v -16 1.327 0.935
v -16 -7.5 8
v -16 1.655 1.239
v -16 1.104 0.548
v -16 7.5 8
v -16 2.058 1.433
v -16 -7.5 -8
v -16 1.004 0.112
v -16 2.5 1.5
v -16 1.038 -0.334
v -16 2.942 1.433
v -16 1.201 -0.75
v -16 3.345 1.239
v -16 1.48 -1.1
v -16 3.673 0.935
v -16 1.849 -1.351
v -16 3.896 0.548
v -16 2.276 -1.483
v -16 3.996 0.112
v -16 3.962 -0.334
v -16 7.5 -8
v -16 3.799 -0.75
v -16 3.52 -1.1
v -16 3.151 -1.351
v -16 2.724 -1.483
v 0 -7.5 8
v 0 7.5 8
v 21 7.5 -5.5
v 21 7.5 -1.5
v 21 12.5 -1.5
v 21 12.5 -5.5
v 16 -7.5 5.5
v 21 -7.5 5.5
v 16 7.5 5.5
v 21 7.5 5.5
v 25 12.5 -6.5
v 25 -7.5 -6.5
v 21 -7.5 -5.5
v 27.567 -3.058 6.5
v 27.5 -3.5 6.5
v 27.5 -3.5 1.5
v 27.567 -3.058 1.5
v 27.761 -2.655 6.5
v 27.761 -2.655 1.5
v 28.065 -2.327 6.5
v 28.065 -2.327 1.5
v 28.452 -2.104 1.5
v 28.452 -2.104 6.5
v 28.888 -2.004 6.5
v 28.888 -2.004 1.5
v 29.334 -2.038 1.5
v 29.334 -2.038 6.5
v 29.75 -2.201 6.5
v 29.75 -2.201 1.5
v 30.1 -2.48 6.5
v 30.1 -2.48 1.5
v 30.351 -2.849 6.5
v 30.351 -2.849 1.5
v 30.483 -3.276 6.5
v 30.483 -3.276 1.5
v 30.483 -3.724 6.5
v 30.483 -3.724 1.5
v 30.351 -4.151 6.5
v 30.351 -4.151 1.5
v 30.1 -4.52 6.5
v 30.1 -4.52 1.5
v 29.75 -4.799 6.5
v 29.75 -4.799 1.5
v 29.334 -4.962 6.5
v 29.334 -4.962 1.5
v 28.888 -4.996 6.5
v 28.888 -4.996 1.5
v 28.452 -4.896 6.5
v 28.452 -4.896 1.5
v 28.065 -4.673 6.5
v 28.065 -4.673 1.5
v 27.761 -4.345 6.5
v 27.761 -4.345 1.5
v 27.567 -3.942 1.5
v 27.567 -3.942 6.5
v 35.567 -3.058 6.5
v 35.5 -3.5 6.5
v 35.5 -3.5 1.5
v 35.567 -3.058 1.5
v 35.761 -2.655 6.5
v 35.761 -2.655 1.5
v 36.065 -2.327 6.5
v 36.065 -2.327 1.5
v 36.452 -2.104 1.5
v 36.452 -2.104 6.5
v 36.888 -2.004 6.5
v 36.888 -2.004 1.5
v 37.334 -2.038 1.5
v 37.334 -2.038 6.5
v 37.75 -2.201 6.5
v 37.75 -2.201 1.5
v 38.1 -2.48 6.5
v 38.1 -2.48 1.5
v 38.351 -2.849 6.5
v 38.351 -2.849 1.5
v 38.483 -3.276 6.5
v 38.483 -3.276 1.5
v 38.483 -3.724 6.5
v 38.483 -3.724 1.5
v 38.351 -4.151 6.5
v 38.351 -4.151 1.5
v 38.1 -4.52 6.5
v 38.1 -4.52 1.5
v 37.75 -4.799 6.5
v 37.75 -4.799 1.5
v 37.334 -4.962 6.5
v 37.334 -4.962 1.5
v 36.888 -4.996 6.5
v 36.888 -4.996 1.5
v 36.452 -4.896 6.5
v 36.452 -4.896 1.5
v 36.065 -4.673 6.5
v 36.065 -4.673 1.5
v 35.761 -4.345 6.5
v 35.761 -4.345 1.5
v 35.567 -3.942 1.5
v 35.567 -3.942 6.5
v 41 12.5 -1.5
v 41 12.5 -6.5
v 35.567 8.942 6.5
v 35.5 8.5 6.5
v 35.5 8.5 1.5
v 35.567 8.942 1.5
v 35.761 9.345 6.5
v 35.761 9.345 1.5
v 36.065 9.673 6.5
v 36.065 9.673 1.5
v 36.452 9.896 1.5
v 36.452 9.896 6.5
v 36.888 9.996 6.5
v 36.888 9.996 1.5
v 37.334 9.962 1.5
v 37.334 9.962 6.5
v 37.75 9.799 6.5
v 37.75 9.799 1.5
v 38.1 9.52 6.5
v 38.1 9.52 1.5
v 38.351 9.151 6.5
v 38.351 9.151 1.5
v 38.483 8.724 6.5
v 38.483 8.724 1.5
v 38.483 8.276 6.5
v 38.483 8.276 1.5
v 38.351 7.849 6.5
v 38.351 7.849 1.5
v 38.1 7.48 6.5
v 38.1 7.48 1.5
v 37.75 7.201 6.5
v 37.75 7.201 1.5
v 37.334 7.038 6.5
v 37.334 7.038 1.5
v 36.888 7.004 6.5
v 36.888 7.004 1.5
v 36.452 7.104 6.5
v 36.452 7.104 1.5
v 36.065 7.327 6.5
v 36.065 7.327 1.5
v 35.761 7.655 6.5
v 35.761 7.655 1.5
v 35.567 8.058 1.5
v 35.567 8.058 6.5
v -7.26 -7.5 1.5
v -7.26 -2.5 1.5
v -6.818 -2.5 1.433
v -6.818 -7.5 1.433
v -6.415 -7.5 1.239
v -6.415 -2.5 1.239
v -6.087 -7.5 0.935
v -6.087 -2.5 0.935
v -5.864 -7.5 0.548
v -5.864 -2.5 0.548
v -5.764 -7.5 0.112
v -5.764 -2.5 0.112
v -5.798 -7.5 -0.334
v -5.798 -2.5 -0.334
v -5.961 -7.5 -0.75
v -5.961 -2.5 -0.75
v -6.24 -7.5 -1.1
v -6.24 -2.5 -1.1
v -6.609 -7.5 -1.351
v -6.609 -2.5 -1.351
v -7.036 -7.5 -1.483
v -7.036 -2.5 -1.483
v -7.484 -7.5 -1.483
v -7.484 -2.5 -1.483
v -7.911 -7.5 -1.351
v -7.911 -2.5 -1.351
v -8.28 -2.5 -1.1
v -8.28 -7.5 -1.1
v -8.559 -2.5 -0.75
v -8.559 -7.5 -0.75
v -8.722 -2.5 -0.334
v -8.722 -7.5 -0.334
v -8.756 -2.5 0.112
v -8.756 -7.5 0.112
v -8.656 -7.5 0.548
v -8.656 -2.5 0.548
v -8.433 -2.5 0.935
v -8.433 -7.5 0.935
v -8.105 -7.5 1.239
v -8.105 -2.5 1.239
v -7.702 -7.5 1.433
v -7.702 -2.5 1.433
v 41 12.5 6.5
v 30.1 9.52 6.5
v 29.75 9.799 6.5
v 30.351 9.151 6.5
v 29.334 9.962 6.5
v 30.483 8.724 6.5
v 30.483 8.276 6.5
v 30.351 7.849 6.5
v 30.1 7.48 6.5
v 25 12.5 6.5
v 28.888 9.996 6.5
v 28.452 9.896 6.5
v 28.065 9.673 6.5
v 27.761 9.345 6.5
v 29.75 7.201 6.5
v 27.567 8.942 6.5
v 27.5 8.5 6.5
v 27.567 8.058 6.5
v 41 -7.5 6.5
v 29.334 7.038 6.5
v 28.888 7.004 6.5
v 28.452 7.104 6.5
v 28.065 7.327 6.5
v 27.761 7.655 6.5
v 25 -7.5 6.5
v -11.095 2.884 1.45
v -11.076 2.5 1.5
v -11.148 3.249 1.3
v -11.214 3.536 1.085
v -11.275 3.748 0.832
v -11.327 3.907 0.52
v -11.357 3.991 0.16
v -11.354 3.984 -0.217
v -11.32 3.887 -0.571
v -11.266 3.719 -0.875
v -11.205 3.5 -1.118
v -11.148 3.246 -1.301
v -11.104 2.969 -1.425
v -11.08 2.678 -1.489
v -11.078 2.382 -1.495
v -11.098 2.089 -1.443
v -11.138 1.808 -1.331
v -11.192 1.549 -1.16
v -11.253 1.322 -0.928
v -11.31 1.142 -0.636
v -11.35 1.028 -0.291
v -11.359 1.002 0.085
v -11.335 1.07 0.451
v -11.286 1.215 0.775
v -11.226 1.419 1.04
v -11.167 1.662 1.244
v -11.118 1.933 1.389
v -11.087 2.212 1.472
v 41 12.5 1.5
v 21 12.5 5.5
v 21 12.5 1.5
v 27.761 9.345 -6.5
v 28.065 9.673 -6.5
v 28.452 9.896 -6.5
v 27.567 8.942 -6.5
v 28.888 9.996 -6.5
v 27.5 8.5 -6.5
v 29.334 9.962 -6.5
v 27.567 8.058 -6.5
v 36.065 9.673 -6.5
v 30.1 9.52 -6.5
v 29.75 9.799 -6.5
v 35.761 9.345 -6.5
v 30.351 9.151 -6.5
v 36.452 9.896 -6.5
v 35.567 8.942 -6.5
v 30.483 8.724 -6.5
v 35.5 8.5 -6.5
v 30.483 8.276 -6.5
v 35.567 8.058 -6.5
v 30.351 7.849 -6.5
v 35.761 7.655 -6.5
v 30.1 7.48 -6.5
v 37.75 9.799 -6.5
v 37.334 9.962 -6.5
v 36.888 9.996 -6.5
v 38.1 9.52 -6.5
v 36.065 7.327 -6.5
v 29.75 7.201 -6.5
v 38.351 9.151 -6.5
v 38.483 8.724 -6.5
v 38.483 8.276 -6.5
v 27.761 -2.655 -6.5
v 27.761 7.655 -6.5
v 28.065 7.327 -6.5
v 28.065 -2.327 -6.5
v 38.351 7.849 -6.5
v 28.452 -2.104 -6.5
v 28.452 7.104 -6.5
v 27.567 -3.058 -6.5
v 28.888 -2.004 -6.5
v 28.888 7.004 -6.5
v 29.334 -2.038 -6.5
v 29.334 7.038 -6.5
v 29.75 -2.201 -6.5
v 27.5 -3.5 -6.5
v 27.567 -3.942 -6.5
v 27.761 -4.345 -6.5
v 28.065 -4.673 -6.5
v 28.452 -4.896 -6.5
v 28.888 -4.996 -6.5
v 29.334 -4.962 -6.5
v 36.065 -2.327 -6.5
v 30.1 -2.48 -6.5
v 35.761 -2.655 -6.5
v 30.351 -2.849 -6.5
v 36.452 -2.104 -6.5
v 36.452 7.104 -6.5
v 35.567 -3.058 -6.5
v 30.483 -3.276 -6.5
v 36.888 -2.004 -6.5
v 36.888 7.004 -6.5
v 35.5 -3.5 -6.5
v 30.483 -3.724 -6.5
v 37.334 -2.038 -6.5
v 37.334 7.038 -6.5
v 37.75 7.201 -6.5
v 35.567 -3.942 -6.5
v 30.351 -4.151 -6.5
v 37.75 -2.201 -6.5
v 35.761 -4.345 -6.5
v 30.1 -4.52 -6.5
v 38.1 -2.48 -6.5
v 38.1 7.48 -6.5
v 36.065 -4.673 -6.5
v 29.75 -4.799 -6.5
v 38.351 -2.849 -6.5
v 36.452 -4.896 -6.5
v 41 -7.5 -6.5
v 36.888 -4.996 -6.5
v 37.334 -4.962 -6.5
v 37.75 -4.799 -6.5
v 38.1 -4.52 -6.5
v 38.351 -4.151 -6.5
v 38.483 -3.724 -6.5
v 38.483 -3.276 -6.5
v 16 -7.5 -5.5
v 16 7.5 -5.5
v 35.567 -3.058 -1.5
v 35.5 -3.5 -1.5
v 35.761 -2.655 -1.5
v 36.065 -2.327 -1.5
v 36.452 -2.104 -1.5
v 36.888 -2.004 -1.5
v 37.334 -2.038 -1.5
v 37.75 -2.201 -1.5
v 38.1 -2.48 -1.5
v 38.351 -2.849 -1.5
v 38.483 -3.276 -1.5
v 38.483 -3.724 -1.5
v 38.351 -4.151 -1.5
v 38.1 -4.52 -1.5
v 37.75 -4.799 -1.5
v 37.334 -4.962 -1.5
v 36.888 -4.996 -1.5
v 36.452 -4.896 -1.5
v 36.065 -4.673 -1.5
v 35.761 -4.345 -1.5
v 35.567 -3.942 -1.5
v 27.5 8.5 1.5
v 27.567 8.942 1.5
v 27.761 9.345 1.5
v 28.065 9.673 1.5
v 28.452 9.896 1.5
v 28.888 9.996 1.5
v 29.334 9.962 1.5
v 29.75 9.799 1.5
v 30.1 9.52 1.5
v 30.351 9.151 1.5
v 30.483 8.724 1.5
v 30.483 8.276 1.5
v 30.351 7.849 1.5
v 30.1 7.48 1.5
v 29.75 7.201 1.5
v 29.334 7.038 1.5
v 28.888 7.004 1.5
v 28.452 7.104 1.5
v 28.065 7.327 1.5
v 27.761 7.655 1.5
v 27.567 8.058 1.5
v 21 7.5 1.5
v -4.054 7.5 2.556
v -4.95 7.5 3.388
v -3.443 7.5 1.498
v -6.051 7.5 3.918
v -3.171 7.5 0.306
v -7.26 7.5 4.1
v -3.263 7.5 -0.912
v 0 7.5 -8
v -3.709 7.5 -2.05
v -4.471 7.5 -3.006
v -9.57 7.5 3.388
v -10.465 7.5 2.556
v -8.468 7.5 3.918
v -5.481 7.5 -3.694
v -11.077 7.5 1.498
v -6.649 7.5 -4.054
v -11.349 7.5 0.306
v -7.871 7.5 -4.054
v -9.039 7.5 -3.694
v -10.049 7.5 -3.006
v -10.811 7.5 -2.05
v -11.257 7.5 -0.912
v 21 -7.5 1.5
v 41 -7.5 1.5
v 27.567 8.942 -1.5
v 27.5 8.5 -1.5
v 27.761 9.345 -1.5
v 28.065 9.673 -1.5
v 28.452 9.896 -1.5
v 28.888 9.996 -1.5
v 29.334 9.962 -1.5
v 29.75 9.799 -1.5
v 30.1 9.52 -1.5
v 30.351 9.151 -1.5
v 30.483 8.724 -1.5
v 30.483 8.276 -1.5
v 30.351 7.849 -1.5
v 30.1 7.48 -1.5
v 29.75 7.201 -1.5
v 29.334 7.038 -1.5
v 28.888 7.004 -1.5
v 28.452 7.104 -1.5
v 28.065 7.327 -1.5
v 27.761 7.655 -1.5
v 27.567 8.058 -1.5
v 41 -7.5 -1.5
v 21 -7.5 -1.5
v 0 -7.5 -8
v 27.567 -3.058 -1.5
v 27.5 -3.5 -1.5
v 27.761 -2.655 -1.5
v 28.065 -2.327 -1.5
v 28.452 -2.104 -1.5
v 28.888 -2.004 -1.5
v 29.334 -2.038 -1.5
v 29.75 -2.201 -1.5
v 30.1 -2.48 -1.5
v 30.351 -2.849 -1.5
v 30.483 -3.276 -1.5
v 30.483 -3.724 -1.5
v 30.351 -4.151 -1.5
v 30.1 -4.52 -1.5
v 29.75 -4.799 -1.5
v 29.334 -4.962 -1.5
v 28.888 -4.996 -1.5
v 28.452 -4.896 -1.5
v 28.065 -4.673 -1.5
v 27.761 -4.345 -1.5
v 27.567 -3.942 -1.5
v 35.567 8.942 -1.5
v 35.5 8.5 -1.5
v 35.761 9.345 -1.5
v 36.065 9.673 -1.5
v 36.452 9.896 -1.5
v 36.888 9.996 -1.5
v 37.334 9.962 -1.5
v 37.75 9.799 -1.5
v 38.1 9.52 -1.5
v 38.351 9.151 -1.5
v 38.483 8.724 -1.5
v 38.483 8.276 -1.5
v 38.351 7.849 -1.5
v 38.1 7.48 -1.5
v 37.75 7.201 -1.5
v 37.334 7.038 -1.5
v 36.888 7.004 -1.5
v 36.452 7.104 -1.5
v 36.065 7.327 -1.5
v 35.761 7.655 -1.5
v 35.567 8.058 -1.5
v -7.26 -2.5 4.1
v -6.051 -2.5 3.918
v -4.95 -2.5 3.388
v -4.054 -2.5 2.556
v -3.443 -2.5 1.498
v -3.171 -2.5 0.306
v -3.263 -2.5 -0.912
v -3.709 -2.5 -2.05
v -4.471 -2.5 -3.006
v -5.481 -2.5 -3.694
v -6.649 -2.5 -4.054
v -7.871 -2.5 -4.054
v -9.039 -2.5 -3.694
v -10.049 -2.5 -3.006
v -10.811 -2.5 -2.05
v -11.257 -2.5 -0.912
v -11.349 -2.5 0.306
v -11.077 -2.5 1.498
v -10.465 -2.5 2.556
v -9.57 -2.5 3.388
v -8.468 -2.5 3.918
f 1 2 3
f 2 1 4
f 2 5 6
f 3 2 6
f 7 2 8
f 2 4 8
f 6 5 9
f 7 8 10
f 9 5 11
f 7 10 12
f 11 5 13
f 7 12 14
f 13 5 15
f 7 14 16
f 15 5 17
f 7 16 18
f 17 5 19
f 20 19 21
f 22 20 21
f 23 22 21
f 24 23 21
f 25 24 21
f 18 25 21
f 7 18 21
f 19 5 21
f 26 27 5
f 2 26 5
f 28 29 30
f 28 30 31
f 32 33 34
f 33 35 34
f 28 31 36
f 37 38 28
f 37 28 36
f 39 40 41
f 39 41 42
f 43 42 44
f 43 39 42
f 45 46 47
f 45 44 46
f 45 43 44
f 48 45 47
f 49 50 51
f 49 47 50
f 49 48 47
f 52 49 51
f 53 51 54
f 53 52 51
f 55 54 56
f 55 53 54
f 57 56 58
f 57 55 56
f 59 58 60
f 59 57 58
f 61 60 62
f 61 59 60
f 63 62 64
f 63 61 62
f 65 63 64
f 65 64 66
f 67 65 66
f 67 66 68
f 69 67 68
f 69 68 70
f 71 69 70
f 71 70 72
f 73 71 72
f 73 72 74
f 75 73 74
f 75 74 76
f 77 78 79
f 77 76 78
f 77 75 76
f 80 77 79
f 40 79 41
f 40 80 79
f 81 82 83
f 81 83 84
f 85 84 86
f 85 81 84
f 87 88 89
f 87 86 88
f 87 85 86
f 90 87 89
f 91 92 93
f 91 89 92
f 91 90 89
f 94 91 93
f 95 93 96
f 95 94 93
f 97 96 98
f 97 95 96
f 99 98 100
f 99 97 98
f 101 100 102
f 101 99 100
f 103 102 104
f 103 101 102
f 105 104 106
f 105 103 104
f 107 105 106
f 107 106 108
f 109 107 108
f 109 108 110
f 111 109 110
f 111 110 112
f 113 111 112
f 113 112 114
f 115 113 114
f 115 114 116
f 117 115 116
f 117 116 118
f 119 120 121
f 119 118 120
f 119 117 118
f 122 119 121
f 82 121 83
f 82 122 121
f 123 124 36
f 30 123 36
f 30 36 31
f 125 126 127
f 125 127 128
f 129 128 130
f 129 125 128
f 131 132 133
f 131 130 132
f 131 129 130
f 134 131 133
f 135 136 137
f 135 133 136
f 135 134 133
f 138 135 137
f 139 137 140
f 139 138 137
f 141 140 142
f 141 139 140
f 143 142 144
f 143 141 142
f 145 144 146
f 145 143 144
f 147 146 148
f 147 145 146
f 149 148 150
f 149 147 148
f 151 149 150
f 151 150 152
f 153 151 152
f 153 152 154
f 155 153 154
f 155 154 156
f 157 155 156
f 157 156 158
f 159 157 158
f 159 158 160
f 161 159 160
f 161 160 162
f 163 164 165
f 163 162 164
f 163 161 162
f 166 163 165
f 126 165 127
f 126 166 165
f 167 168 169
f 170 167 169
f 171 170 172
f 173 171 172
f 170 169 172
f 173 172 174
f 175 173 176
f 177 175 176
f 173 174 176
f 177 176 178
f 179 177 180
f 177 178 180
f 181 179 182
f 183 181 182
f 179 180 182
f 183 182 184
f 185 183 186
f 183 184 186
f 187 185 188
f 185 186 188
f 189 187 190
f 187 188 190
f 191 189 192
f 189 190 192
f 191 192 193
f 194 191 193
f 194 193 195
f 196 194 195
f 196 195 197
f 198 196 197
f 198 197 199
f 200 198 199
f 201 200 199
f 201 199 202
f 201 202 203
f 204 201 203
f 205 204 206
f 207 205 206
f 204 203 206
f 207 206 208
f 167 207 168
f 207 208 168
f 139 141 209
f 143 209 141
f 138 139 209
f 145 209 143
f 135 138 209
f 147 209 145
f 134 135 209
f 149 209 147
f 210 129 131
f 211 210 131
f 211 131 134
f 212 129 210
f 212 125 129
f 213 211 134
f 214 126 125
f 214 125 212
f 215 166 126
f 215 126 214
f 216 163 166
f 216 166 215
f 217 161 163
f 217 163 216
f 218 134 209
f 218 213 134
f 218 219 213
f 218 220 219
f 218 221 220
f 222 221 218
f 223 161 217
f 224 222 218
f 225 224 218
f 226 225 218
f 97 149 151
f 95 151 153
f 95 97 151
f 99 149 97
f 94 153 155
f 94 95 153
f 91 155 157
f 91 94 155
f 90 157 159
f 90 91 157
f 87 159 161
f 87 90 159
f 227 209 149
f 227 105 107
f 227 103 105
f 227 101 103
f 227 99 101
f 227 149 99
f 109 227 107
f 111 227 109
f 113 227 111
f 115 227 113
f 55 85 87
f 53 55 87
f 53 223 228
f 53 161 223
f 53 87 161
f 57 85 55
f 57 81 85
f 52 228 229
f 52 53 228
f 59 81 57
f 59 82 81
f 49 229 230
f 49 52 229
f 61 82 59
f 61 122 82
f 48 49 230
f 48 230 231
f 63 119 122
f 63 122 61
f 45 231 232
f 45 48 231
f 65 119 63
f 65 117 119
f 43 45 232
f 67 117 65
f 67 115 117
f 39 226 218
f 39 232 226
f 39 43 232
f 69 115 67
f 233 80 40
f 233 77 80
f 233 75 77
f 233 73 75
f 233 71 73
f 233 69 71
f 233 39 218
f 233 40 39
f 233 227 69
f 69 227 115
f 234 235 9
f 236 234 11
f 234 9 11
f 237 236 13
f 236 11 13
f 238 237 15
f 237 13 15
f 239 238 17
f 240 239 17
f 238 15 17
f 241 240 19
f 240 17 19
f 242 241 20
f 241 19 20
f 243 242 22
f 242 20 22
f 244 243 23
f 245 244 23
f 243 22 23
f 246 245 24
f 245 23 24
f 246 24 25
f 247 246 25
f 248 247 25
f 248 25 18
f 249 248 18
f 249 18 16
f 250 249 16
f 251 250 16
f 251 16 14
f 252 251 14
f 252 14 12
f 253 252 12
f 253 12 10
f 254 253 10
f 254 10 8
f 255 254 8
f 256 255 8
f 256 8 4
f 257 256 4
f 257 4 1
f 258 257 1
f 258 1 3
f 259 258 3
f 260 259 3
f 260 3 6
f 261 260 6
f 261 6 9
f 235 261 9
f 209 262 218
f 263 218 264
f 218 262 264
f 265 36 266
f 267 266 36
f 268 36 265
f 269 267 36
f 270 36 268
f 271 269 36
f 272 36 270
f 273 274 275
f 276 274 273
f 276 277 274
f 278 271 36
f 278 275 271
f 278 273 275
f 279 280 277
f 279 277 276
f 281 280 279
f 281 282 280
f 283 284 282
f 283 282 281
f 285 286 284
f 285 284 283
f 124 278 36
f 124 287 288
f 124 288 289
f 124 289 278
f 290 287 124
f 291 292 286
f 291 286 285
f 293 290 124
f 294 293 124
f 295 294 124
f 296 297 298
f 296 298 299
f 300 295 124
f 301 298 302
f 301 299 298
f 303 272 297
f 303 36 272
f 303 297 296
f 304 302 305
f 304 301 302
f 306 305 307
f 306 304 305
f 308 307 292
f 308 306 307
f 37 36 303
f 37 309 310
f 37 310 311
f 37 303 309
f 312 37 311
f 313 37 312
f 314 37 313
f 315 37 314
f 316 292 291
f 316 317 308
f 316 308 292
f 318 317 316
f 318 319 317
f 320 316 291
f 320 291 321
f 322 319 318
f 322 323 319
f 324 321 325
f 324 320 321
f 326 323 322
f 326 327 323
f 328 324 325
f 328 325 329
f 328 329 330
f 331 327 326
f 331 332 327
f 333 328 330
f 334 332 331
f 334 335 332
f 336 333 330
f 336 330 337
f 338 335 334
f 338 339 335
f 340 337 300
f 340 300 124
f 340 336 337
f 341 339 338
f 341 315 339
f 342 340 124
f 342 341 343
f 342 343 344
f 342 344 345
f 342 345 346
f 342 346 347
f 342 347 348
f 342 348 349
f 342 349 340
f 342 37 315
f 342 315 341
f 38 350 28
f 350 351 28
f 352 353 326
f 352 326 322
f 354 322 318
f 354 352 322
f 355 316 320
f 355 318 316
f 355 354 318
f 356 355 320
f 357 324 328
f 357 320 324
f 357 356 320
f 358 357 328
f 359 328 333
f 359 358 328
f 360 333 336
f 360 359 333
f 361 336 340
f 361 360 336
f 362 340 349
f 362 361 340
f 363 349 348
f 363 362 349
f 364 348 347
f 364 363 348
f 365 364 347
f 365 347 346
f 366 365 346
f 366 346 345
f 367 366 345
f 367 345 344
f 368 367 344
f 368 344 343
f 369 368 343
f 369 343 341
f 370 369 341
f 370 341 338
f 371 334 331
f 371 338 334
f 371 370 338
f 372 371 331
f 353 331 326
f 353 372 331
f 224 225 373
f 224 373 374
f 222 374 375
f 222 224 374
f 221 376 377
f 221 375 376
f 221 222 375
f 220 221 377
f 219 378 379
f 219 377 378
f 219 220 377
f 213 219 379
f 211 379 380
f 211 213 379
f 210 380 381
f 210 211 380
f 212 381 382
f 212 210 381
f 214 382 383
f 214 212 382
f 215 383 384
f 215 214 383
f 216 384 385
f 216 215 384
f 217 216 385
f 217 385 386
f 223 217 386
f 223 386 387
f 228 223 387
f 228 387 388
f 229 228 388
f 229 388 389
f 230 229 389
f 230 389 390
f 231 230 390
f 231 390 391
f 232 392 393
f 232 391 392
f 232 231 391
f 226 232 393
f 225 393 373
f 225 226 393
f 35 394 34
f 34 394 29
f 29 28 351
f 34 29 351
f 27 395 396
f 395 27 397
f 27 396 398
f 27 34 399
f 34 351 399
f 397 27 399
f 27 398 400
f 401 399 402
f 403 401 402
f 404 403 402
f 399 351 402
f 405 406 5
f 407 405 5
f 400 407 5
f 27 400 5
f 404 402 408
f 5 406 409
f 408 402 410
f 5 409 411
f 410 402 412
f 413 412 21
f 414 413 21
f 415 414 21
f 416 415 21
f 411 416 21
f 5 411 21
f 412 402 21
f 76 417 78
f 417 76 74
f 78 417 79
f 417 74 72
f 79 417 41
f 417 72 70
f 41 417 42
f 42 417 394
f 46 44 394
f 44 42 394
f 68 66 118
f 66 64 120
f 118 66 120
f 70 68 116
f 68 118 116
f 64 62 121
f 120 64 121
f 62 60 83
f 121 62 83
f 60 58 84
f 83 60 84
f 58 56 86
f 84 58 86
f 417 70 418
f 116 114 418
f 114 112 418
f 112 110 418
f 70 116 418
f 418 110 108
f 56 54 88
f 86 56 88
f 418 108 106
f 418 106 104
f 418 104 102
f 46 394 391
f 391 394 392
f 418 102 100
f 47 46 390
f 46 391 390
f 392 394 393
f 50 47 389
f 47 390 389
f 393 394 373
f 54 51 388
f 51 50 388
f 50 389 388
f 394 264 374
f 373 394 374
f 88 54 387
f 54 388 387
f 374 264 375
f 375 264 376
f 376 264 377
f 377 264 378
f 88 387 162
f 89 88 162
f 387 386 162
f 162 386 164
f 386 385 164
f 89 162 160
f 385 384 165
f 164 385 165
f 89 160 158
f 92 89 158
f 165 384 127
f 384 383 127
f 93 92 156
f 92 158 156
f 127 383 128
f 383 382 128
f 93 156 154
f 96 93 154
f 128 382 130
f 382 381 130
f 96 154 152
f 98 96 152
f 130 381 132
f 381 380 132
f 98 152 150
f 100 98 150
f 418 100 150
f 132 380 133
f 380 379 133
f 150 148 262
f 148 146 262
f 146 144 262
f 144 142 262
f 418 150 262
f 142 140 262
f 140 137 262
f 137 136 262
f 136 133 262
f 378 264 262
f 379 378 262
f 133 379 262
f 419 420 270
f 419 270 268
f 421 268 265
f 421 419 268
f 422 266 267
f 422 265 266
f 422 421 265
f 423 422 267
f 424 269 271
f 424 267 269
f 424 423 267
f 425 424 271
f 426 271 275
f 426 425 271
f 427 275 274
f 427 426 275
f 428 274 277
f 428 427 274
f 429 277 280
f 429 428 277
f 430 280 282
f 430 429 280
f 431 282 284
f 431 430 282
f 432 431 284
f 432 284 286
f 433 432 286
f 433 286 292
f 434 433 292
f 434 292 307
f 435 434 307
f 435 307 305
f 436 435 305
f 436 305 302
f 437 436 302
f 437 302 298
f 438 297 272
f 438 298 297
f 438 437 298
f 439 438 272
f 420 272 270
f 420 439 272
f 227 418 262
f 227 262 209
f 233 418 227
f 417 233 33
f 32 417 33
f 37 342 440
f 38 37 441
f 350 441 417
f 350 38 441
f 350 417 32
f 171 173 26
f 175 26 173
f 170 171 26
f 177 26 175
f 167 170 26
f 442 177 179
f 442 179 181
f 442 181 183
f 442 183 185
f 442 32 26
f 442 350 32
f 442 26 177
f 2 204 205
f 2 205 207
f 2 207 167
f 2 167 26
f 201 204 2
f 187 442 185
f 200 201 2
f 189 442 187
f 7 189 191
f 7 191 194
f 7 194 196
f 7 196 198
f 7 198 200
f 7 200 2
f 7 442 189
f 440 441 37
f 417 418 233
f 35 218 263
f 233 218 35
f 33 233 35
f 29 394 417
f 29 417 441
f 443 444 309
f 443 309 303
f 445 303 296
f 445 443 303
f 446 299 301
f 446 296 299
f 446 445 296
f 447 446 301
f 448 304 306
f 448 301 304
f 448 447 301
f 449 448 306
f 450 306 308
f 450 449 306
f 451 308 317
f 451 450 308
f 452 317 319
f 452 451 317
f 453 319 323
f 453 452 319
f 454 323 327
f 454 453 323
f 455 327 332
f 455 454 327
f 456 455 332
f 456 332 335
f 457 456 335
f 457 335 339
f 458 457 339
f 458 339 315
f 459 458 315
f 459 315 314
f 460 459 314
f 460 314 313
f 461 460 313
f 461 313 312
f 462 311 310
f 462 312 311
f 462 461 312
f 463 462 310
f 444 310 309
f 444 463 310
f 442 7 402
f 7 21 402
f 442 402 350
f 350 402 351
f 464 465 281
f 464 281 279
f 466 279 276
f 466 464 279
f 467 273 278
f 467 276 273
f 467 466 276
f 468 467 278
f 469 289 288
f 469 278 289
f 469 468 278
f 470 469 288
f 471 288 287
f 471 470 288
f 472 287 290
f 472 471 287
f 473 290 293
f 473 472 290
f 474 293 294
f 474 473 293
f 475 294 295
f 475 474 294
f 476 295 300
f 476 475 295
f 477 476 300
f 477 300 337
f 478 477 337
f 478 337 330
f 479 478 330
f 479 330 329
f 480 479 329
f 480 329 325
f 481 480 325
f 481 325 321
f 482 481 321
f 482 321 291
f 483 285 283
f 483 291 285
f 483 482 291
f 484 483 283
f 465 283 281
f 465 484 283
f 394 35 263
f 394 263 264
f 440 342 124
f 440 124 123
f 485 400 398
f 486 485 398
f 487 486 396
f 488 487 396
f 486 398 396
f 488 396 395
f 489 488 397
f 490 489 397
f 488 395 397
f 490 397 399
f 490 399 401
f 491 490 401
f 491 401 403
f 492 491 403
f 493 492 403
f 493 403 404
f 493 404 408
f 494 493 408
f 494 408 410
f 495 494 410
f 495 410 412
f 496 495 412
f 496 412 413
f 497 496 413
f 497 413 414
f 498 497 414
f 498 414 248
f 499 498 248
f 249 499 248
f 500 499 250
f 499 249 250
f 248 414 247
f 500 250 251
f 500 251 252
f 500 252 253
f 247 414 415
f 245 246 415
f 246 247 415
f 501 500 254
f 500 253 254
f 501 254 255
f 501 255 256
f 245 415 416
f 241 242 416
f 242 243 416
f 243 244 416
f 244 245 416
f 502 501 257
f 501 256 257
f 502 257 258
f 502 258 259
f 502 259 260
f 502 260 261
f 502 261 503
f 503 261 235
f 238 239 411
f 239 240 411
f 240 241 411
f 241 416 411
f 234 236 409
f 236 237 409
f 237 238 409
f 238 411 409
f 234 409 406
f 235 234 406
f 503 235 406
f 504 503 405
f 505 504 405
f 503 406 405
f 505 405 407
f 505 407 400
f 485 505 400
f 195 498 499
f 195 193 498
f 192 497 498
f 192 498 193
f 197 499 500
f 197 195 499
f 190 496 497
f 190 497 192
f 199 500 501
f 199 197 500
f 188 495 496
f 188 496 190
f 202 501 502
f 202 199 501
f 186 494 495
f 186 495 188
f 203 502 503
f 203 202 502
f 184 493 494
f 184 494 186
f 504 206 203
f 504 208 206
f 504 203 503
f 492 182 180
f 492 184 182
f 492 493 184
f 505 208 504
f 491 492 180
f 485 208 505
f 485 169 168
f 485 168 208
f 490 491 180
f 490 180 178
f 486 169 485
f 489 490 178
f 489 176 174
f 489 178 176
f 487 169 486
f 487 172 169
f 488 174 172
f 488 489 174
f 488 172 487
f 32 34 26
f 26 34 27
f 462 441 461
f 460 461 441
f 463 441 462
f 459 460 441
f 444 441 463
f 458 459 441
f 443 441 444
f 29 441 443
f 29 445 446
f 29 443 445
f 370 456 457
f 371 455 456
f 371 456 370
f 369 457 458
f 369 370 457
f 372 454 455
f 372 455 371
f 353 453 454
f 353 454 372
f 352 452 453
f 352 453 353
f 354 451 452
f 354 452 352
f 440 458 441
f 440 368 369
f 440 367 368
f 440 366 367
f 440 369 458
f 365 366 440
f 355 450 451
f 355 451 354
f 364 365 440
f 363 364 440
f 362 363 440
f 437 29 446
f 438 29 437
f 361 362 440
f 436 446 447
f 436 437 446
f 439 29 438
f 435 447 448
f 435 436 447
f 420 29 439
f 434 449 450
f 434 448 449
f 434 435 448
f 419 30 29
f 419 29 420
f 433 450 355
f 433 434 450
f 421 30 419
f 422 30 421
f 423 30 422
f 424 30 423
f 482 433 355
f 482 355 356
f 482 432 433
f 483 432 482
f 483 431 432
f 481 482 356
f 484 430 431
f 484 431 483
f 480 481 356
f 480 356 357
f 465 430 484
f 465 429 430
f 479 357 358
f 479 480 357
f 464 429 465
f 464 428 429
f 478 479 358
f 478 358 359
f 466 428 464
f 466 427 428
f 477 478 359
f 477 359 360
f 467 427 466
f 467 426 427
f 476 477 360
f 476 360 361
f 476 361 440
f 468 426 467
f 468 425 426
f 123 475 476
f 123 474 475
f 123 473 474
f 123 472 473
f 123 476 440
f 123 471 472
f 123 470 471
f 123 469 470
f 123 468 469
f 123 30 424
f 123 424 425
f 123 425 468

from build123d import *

# Parameters (mm, degrees)
BOSS_EXTRUDE1_DEPTH     = 7.5
SKETCH4_R               = 4.1
CUT_EXTRUDE1_DEPTH      = 10
SKETCH5_R               = 1.5
CUT_EXTRUDE2_DEPTH      = 5
CUT_EXTRUDE4_REACH      = 40.591
CUT_EXTRUDE4_END_RADIUS = 4.1
SKETCH7_R               = 1.5
BOSS_EXTRUDE2_DEPTH     = 20
SKETCH10_W              = 20
SKETCH10_H              = 3
CUT_EXTRUDE5_DEPTH      = 20
CUT_EXTRUDE6_DEPTH      = 46.249309387
CUT_EXTRUDE6_DEPTH_BACK = 46.249309387
SKETCH11_R              = 1.5


with BuildPart() as part:
    # Sketch2 → Boss-Extrude1 (new, symmetric)
    with BuildSketch(Plane(origin=(0, 0, 0), x_dir=(1, 0, 0), z_dir=(0, 1, 0))):
        Polygon((-16, -8), (-16, 8), (0, 8), (16, 5.5), (21, 5.5), (21, -5.5), (16, -5.5), (0, -8), align=None)
    extrude(amount=BOSS_EXTRUDE1_DEPTH, both=True)

    # Sketch4 → Cut-Extrude1 (cut)
    with BuildSketch(Plane(origin=(0, 7.5, 0), x_dir=(1, 0, 0), z_dir=(0, 1, 0))):
        with Locations(Location((-7.259972257, 0, 0), (0, 0, 270))):
            Circle(SKETCH4_R)
    extrude(amount=-CUT_EXTRUDE1_DEPTH, mode=Mode.SUBTRACT)

    # Sketch5 → Cut-Extrude2 (cut)
    with BuildSketch(Plane(origin=(0, -2.5, 0), x_dir=(1, 0, 0), z_dir=(0, 1, 0))):
        with Locations(Location((-7.259972257, 0, 0), (0, 0, 270))):
            Circle(SKETCH5_R)
    extrude(amount=-CUT_EXTRUDE2_DEPTH, mode=Mode.SUBTRACT)

    # Cut-Extrude4: up to this cylinder (the profile starts outside it)
    cut_extrude4_end = Plane(origin=(-7.259972257, 2.5, 0), z_dir=(0, 1, 0)) * Cylinder(CUT_EXTRUDE4_END_RADIUS, 90.382, mode=Mode.PRIVATE)
    # Sketch7 → Cut-Extrude4 (cut, up to the surface)
    with BuildSketch(Plane.ZY.offset(16), mode=Mode.PRIVATE) as cut_extrude4_sk1:
        with Locations((0, 2.5)):
            Circle(SKETCH7_R)
    cut_extrude4_tool1 = extrude(cut_extrude4_sk1.sketch, amount=-CUT_EXTRUDE4_REACH, mode=Mode.PRIVATE) - cut_extrude4_end
    add(cut_extrude4_tool1.solids().sort_by_distance((-16, 2.5, 0))[0], mode=Mode.SUBTRACT)

    # Sketch9 → Boss-Extrude2 (add)
    with BuildSketch(Plane(origin=(0, -7.5, 0), x_dir=(1, 0, 0), z_dir=(0, 1, 0))):
        Polygon((21, 5.5), (25, 6.5), (41, 6.5), (41, -6.5), (25, -6.5), (21, -5.5), align=None)
    extrude(amount=BOSS_EXTRUDE2_DEPTH)

    # Sketch10 → Cut-Extrude5 (cut)
    with BuildSketch(Plane(origin=(0, 12.5, 0), x_dir=(1, 0, 0), z_dir=(0, 1, 0))):
        with Locations((31, 0)):
            Rectangle(SKETCH10_W, SKETCH10_H)
    extrude(amount=-CUT_EXTRUDE5_DEPTH, mode=Mode.SUBTRACT)

    # Sketch11 → Cut-Extrude6 (cut, two sides: drawn at the far end of the back side and taken through both)
    with BuildSketch(Plane(origin=(0, 0, -6.5), x_dir=(-1, 0, 0), z_dir=(0, 0, -1)).offset(-CUT_EXTRUDE6_DEPTH_BACK)):
        with Locations((-37, 8.5)):
            Circle(SKETCH11_R)
        with Locations((-29, 8.5)):
            Circle(SKETCH11_R)
        with Locations((-37, -3.5)):
            Circle(SKETCH11_R)
        with Locations((-29, -3.5)):
            Circle(SKETCH11_R)
    extrude(amount=CUT_EXTRUDE6_DEPTH + CUT_EXTRUDE6_DEPTH_BACK, mode=Mode.SUBTRACT)


solid = part.part
